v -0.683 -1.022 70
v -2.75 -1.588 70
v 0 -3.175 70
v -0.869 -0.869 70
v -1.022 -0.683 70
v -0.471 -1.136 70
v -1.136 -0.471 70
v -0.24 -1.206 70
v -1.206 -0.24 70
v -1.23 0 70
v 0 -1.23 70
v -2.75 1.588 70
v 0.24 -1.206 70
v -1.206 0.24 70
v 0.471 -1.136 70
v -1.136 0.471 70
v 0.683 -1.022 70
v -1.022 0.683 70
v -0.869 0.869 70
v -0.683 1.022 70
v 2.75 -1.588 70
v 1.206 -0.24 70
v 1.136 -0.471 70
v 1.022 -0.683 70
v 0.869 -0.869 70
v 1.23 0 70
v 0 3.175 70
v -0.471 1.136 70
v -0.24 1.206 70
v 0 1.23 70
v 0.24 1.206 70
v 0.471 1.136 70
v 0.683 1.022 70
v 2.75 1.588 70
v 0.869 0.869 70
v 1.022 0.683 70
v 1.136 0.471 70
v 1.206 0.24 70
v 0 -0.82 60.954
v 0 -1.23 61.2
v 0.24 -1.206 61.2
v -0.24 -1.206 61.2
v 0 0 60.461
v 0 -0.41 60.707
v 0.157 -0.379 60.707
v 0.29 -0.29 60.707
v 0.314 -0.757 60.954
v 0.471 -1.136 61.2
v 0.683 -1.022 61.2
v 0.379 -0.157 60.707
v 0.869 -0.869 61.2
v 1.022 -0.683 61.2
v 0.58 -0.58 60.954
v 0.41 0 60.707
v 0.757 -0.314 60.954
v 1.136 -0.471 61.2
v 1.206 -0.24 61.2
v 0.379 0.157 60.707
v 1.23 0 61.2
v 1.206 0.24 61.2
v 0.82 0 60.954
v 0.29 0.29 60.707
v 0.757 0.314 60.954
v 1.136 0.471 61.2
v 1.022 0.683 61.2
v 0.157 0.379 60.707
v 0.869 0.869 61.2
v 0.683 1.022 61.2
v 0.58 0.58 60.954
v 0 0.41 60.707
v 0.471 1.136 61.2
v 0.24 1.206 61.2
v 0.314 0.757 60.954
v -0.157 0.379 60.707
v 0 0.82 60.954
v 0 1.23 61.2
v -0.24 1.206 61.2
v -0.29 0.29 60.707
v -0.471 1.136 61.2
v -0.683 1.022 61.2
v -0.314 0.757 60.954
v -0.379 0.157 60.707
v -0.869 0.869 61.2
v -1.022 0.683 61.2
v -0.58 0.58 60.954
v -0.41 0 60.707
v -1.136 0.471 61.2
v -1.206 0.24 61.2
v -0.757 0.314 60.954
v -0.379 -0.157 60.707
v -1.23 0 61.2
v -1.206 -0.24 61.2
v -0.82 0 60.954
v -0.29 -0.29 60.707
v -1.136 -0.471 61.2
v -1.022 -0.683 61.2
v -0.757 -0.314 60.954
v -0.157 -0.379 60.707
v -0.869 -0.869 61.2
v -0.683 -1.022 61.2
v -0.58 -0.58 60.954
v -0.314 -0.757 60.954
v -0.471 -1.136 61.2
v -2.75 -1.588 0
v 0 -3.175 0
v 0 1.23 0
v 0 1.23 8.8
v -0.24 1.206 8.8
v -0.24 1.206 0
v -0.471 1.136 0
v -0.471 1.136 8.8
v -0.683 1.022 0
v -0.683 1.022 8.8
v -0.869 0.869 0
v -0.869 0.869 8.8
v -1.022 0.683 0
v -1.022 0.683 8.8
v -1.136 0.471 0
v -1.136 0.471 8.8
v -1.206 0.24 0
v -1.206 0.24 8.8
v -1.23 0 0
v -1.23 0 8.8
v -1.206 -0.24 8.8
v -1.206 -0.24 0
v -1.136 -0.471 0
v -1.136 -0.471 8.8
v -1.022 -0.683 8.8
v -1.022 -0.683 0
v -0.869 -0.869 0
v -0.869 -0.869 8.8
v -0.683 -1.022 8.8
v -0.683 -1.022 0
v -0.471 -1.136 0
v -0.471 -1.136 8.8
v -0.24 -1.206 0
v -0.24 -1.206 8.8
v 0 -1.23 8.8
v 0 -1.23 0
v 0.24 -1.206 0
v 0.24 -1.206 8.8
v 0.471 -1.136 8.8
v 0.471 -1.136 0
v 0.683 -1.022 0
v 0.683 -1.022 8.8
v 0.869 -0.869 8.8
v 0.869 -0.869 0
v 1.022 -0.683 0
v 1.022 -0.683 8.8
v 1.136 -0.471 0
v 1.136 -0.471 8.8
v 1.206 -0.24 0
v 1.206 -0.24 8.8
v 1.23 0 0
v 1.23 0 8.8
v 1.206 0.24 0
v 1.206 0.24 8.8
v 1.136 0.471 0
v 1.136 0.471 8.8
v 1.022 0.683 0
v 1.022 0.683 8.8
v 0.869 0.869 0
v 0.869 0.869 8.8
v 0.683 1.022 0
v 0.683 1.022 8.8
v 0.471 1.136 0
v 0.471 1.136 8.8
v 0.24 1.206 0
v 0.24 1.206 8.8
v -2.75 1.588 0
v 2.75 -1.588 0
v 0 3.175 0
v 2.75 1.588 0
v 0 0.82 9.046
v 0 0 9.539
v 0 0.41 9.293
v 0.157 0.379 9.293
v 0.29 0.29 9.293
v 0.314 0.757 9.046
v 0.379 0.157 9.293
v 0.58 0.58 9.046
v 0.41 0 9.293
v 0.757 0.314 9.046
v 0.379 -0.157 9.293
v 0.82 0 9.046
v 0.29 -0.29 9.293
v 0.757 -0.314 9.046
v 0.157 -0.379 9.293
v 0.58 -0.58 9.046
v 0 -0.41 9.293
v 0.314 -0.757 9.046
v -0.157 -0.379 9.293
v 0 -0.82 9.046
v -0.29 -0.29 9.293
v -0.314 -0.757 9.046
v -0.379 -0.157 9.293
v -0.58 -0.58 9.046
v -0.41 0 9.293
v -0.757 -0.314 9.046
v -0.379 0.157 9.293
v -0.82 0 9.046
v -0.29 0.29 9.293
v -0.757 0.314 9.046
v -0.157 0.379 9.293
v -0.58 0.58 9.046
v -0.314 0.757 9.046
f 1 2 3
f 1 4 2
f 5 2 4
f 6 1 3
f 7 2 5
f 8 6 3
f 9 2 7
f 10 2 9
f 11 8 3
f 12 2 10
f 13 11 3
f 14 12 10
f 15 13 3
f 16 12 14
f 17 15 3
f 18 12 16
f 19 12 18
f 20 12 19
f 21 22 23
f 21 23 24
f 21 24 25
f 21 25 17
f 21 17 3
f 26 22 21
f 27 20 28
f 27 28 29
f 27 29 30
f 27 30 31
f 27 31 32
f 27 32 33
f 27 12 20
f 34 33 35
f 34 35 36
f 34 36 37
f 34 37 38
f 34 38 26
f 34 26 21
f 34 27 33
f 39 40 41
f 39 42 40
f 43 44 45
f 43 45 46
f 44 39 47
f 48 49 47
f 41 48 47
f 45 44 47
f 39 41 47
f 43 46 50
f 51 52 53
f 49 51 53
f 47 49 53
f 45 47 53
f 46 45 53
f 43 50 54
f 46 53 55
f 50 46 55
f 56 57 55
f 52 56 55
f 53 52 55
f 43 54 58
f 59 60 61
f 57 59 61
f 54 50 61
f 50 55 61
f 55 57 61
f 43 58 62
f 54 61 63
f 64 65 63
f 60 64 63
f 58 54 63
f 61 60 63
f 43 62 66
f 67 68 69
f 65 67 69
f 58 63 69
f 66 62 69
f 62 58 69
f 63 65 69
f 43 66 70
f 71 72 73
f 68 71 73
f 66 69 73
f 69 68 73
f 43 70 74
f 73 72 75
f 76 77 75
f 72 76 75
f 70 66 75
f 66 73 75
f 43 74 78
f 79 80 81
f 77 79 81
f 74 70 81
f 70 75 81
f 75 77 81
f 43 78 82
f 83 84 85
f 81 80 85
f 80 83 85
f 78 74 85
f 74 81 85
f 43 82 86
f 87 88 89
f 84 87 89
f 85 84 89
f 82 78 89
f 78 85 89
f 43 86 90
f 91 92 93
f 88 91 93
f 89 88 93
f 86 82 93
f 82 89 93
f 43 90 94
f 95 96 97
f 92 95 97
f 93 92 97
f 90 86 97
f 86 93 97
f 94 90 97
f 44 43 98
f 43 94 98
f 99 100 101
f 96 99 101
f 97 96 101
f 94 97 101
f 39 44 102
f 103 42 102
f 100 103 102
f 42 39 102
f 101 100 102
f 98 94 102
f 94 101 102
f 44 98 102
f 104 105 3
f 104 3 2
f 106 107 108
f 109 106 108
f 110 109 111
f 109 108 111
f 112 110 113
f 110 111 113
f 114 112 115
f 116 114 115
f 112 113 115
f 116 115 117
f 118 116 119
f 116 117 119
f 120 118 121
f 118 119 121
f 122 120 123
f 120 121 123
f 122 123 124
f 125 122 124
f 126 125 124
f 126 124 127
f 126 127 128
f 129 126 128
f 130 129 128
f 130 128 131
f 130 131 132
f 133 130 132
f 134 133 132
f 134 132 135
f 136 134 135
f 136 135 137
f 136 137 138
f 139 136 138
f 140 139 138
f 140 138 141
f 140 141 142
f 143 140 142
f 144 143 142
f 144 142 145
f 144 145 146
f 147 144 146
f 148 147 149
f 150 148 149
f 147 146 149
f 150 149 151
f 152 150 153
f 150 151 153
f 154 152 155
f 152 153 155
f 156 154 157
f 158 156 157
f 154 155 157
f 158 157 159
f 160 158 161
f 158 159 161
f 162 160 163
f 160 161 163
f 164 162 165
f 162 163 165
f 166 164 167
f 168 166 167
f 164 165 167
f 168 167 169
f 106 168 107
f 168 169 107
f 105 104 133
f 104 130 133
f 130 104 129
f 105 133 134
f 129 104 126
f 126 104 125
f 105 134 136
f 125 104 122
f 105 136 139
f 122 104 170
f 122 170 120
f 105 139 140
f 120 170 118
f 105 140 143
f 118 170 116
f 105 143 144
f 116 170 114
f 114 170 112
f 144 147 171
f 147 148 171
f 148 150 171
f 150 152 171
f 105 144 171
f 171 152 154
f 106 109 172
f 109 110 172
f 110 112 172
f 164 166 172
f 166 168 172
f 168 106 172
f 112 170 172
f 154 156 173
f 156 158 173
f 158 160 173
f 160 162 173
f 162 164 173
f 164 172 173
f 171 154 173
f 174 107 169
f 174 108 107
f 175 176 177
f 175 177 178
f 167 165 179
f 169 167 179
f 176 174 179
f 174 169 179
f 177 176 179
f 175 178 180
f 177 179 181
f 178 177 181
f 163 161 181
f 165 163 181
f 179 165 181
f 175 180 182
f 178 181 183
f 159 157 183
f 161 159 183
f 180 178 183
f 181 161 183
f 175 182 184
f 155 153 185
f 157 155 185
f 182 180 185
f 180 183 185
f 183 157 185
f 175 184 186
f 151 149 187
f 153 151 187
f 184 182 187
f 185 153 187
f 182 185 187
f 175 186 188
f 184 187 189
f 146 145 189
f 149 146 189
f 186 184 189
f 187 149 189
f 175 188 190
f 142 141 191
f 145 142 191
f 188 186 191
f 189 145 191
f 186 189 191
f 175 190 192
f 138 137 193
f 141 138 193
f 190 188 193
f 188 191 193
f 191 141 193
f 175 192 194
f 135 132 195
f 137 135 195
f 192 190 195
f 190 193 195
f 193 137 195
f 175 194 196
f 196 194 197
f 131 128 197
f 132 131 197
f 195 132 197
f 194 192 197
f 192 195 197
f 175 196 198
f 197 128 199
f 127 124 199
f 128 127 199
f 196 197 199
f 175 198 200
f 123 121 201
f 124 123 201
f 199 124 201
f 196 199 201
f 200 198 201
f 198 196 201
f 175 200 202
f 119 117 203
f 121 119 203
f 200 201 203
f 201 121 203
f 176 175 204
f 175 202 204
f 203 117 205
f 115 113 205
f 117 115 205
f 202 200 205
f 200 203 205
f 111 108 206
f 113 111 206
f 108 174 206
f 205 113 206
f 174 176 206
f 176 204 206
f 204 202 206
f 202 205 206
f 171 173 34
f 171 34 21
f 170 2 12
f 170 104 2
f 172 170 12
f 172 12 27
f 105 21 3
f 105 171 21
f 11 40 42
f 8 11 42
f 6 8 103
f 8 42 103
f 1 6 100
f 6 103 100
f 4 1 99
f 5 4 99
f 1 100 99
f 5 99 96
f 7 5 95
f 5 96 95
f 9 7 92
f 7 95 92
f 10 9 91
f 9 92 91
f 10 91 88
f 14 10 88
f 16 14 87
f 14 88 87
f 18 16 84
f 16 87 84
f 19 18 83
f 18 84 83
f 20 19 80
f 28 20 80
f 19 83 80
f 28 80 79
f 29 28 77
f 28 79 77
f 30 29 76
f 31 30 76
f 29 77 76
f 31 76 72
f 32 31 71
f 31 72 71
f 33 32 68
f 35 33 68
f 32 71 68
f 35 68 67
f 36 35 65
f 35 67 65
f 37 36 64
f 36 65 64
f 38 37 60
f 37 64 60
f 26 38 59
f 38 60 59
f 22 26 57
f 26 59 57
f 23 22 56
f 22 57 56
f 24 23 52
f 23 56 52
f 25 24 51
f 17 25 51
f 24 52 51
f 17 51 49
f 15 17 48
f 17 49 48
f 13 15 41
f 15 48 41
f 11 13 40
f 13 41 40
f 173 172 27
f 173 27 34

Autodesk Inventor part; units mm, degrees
ref_plane "YZ Plane" through (0, 0, 0) normal (1, 0, 0) x (0, 1, 0)
ref_plane "XZ Plane" through (0, 0, 0) normal (0, 1, 0) x (-1, 0, 0)
ref_plane "XY Plane" through (0, 0, 0) normal (0, 0, 1) x (1, 0, 0)
sketch "スケッチ1" plane through (0, 0, 0) normal (0, 0, 1) x (1, 0, 0)
  line L0 (0, 3.1754) -> (2.75, 1.5877)
  line L1 (2.75, 1.5877) -> (2.75, -1.5877)
  line L2 (2.75, -1.5877) -> (0, -3.1754)
  line L3 (0, -3.1754) -> (-2.75, -1.5877)
  line L4 (-2.75, -1.5877) -> (-2.75, 1.5877)
  line L5 (-2.75, 1.5877) -> (0, 3.1754)
  point P0 (0, 0)
  point P1 (0, 0)
  dimension "d0" = 5.5
extrude "押し出し1" add sketch "スケッチ1" along normal blind 70
sketch "スケッチ2" plane through (0, 0, 70) normal (0, 0, 1) x (1, 0, 0)
  point P0 (0, 0)
hole "穴1" at (0, 0, 70) direction (0, 0, -1) diameter 2.459 depth 8.8 tip angle 118 thread size "M3x0.5" class "6H" standard "ISO Metric profile"
sketch "スケッチ3" plane through (0, 0, 0) normal (0, 0, -1) x (-1, 0, 0)
  point P0 (0, 0)
hole "穴2" at (0, 0, 0) direction (0, 0, 1) diameter 2.459 depth 8.8 tip angle 118 thread size "M3x0.5" class "6H" standard "ISO Metric profile"
properties part number "アルミスペーサー(六角・酸洗処理）_ASL-370E" material "アルミニウム 6061"
